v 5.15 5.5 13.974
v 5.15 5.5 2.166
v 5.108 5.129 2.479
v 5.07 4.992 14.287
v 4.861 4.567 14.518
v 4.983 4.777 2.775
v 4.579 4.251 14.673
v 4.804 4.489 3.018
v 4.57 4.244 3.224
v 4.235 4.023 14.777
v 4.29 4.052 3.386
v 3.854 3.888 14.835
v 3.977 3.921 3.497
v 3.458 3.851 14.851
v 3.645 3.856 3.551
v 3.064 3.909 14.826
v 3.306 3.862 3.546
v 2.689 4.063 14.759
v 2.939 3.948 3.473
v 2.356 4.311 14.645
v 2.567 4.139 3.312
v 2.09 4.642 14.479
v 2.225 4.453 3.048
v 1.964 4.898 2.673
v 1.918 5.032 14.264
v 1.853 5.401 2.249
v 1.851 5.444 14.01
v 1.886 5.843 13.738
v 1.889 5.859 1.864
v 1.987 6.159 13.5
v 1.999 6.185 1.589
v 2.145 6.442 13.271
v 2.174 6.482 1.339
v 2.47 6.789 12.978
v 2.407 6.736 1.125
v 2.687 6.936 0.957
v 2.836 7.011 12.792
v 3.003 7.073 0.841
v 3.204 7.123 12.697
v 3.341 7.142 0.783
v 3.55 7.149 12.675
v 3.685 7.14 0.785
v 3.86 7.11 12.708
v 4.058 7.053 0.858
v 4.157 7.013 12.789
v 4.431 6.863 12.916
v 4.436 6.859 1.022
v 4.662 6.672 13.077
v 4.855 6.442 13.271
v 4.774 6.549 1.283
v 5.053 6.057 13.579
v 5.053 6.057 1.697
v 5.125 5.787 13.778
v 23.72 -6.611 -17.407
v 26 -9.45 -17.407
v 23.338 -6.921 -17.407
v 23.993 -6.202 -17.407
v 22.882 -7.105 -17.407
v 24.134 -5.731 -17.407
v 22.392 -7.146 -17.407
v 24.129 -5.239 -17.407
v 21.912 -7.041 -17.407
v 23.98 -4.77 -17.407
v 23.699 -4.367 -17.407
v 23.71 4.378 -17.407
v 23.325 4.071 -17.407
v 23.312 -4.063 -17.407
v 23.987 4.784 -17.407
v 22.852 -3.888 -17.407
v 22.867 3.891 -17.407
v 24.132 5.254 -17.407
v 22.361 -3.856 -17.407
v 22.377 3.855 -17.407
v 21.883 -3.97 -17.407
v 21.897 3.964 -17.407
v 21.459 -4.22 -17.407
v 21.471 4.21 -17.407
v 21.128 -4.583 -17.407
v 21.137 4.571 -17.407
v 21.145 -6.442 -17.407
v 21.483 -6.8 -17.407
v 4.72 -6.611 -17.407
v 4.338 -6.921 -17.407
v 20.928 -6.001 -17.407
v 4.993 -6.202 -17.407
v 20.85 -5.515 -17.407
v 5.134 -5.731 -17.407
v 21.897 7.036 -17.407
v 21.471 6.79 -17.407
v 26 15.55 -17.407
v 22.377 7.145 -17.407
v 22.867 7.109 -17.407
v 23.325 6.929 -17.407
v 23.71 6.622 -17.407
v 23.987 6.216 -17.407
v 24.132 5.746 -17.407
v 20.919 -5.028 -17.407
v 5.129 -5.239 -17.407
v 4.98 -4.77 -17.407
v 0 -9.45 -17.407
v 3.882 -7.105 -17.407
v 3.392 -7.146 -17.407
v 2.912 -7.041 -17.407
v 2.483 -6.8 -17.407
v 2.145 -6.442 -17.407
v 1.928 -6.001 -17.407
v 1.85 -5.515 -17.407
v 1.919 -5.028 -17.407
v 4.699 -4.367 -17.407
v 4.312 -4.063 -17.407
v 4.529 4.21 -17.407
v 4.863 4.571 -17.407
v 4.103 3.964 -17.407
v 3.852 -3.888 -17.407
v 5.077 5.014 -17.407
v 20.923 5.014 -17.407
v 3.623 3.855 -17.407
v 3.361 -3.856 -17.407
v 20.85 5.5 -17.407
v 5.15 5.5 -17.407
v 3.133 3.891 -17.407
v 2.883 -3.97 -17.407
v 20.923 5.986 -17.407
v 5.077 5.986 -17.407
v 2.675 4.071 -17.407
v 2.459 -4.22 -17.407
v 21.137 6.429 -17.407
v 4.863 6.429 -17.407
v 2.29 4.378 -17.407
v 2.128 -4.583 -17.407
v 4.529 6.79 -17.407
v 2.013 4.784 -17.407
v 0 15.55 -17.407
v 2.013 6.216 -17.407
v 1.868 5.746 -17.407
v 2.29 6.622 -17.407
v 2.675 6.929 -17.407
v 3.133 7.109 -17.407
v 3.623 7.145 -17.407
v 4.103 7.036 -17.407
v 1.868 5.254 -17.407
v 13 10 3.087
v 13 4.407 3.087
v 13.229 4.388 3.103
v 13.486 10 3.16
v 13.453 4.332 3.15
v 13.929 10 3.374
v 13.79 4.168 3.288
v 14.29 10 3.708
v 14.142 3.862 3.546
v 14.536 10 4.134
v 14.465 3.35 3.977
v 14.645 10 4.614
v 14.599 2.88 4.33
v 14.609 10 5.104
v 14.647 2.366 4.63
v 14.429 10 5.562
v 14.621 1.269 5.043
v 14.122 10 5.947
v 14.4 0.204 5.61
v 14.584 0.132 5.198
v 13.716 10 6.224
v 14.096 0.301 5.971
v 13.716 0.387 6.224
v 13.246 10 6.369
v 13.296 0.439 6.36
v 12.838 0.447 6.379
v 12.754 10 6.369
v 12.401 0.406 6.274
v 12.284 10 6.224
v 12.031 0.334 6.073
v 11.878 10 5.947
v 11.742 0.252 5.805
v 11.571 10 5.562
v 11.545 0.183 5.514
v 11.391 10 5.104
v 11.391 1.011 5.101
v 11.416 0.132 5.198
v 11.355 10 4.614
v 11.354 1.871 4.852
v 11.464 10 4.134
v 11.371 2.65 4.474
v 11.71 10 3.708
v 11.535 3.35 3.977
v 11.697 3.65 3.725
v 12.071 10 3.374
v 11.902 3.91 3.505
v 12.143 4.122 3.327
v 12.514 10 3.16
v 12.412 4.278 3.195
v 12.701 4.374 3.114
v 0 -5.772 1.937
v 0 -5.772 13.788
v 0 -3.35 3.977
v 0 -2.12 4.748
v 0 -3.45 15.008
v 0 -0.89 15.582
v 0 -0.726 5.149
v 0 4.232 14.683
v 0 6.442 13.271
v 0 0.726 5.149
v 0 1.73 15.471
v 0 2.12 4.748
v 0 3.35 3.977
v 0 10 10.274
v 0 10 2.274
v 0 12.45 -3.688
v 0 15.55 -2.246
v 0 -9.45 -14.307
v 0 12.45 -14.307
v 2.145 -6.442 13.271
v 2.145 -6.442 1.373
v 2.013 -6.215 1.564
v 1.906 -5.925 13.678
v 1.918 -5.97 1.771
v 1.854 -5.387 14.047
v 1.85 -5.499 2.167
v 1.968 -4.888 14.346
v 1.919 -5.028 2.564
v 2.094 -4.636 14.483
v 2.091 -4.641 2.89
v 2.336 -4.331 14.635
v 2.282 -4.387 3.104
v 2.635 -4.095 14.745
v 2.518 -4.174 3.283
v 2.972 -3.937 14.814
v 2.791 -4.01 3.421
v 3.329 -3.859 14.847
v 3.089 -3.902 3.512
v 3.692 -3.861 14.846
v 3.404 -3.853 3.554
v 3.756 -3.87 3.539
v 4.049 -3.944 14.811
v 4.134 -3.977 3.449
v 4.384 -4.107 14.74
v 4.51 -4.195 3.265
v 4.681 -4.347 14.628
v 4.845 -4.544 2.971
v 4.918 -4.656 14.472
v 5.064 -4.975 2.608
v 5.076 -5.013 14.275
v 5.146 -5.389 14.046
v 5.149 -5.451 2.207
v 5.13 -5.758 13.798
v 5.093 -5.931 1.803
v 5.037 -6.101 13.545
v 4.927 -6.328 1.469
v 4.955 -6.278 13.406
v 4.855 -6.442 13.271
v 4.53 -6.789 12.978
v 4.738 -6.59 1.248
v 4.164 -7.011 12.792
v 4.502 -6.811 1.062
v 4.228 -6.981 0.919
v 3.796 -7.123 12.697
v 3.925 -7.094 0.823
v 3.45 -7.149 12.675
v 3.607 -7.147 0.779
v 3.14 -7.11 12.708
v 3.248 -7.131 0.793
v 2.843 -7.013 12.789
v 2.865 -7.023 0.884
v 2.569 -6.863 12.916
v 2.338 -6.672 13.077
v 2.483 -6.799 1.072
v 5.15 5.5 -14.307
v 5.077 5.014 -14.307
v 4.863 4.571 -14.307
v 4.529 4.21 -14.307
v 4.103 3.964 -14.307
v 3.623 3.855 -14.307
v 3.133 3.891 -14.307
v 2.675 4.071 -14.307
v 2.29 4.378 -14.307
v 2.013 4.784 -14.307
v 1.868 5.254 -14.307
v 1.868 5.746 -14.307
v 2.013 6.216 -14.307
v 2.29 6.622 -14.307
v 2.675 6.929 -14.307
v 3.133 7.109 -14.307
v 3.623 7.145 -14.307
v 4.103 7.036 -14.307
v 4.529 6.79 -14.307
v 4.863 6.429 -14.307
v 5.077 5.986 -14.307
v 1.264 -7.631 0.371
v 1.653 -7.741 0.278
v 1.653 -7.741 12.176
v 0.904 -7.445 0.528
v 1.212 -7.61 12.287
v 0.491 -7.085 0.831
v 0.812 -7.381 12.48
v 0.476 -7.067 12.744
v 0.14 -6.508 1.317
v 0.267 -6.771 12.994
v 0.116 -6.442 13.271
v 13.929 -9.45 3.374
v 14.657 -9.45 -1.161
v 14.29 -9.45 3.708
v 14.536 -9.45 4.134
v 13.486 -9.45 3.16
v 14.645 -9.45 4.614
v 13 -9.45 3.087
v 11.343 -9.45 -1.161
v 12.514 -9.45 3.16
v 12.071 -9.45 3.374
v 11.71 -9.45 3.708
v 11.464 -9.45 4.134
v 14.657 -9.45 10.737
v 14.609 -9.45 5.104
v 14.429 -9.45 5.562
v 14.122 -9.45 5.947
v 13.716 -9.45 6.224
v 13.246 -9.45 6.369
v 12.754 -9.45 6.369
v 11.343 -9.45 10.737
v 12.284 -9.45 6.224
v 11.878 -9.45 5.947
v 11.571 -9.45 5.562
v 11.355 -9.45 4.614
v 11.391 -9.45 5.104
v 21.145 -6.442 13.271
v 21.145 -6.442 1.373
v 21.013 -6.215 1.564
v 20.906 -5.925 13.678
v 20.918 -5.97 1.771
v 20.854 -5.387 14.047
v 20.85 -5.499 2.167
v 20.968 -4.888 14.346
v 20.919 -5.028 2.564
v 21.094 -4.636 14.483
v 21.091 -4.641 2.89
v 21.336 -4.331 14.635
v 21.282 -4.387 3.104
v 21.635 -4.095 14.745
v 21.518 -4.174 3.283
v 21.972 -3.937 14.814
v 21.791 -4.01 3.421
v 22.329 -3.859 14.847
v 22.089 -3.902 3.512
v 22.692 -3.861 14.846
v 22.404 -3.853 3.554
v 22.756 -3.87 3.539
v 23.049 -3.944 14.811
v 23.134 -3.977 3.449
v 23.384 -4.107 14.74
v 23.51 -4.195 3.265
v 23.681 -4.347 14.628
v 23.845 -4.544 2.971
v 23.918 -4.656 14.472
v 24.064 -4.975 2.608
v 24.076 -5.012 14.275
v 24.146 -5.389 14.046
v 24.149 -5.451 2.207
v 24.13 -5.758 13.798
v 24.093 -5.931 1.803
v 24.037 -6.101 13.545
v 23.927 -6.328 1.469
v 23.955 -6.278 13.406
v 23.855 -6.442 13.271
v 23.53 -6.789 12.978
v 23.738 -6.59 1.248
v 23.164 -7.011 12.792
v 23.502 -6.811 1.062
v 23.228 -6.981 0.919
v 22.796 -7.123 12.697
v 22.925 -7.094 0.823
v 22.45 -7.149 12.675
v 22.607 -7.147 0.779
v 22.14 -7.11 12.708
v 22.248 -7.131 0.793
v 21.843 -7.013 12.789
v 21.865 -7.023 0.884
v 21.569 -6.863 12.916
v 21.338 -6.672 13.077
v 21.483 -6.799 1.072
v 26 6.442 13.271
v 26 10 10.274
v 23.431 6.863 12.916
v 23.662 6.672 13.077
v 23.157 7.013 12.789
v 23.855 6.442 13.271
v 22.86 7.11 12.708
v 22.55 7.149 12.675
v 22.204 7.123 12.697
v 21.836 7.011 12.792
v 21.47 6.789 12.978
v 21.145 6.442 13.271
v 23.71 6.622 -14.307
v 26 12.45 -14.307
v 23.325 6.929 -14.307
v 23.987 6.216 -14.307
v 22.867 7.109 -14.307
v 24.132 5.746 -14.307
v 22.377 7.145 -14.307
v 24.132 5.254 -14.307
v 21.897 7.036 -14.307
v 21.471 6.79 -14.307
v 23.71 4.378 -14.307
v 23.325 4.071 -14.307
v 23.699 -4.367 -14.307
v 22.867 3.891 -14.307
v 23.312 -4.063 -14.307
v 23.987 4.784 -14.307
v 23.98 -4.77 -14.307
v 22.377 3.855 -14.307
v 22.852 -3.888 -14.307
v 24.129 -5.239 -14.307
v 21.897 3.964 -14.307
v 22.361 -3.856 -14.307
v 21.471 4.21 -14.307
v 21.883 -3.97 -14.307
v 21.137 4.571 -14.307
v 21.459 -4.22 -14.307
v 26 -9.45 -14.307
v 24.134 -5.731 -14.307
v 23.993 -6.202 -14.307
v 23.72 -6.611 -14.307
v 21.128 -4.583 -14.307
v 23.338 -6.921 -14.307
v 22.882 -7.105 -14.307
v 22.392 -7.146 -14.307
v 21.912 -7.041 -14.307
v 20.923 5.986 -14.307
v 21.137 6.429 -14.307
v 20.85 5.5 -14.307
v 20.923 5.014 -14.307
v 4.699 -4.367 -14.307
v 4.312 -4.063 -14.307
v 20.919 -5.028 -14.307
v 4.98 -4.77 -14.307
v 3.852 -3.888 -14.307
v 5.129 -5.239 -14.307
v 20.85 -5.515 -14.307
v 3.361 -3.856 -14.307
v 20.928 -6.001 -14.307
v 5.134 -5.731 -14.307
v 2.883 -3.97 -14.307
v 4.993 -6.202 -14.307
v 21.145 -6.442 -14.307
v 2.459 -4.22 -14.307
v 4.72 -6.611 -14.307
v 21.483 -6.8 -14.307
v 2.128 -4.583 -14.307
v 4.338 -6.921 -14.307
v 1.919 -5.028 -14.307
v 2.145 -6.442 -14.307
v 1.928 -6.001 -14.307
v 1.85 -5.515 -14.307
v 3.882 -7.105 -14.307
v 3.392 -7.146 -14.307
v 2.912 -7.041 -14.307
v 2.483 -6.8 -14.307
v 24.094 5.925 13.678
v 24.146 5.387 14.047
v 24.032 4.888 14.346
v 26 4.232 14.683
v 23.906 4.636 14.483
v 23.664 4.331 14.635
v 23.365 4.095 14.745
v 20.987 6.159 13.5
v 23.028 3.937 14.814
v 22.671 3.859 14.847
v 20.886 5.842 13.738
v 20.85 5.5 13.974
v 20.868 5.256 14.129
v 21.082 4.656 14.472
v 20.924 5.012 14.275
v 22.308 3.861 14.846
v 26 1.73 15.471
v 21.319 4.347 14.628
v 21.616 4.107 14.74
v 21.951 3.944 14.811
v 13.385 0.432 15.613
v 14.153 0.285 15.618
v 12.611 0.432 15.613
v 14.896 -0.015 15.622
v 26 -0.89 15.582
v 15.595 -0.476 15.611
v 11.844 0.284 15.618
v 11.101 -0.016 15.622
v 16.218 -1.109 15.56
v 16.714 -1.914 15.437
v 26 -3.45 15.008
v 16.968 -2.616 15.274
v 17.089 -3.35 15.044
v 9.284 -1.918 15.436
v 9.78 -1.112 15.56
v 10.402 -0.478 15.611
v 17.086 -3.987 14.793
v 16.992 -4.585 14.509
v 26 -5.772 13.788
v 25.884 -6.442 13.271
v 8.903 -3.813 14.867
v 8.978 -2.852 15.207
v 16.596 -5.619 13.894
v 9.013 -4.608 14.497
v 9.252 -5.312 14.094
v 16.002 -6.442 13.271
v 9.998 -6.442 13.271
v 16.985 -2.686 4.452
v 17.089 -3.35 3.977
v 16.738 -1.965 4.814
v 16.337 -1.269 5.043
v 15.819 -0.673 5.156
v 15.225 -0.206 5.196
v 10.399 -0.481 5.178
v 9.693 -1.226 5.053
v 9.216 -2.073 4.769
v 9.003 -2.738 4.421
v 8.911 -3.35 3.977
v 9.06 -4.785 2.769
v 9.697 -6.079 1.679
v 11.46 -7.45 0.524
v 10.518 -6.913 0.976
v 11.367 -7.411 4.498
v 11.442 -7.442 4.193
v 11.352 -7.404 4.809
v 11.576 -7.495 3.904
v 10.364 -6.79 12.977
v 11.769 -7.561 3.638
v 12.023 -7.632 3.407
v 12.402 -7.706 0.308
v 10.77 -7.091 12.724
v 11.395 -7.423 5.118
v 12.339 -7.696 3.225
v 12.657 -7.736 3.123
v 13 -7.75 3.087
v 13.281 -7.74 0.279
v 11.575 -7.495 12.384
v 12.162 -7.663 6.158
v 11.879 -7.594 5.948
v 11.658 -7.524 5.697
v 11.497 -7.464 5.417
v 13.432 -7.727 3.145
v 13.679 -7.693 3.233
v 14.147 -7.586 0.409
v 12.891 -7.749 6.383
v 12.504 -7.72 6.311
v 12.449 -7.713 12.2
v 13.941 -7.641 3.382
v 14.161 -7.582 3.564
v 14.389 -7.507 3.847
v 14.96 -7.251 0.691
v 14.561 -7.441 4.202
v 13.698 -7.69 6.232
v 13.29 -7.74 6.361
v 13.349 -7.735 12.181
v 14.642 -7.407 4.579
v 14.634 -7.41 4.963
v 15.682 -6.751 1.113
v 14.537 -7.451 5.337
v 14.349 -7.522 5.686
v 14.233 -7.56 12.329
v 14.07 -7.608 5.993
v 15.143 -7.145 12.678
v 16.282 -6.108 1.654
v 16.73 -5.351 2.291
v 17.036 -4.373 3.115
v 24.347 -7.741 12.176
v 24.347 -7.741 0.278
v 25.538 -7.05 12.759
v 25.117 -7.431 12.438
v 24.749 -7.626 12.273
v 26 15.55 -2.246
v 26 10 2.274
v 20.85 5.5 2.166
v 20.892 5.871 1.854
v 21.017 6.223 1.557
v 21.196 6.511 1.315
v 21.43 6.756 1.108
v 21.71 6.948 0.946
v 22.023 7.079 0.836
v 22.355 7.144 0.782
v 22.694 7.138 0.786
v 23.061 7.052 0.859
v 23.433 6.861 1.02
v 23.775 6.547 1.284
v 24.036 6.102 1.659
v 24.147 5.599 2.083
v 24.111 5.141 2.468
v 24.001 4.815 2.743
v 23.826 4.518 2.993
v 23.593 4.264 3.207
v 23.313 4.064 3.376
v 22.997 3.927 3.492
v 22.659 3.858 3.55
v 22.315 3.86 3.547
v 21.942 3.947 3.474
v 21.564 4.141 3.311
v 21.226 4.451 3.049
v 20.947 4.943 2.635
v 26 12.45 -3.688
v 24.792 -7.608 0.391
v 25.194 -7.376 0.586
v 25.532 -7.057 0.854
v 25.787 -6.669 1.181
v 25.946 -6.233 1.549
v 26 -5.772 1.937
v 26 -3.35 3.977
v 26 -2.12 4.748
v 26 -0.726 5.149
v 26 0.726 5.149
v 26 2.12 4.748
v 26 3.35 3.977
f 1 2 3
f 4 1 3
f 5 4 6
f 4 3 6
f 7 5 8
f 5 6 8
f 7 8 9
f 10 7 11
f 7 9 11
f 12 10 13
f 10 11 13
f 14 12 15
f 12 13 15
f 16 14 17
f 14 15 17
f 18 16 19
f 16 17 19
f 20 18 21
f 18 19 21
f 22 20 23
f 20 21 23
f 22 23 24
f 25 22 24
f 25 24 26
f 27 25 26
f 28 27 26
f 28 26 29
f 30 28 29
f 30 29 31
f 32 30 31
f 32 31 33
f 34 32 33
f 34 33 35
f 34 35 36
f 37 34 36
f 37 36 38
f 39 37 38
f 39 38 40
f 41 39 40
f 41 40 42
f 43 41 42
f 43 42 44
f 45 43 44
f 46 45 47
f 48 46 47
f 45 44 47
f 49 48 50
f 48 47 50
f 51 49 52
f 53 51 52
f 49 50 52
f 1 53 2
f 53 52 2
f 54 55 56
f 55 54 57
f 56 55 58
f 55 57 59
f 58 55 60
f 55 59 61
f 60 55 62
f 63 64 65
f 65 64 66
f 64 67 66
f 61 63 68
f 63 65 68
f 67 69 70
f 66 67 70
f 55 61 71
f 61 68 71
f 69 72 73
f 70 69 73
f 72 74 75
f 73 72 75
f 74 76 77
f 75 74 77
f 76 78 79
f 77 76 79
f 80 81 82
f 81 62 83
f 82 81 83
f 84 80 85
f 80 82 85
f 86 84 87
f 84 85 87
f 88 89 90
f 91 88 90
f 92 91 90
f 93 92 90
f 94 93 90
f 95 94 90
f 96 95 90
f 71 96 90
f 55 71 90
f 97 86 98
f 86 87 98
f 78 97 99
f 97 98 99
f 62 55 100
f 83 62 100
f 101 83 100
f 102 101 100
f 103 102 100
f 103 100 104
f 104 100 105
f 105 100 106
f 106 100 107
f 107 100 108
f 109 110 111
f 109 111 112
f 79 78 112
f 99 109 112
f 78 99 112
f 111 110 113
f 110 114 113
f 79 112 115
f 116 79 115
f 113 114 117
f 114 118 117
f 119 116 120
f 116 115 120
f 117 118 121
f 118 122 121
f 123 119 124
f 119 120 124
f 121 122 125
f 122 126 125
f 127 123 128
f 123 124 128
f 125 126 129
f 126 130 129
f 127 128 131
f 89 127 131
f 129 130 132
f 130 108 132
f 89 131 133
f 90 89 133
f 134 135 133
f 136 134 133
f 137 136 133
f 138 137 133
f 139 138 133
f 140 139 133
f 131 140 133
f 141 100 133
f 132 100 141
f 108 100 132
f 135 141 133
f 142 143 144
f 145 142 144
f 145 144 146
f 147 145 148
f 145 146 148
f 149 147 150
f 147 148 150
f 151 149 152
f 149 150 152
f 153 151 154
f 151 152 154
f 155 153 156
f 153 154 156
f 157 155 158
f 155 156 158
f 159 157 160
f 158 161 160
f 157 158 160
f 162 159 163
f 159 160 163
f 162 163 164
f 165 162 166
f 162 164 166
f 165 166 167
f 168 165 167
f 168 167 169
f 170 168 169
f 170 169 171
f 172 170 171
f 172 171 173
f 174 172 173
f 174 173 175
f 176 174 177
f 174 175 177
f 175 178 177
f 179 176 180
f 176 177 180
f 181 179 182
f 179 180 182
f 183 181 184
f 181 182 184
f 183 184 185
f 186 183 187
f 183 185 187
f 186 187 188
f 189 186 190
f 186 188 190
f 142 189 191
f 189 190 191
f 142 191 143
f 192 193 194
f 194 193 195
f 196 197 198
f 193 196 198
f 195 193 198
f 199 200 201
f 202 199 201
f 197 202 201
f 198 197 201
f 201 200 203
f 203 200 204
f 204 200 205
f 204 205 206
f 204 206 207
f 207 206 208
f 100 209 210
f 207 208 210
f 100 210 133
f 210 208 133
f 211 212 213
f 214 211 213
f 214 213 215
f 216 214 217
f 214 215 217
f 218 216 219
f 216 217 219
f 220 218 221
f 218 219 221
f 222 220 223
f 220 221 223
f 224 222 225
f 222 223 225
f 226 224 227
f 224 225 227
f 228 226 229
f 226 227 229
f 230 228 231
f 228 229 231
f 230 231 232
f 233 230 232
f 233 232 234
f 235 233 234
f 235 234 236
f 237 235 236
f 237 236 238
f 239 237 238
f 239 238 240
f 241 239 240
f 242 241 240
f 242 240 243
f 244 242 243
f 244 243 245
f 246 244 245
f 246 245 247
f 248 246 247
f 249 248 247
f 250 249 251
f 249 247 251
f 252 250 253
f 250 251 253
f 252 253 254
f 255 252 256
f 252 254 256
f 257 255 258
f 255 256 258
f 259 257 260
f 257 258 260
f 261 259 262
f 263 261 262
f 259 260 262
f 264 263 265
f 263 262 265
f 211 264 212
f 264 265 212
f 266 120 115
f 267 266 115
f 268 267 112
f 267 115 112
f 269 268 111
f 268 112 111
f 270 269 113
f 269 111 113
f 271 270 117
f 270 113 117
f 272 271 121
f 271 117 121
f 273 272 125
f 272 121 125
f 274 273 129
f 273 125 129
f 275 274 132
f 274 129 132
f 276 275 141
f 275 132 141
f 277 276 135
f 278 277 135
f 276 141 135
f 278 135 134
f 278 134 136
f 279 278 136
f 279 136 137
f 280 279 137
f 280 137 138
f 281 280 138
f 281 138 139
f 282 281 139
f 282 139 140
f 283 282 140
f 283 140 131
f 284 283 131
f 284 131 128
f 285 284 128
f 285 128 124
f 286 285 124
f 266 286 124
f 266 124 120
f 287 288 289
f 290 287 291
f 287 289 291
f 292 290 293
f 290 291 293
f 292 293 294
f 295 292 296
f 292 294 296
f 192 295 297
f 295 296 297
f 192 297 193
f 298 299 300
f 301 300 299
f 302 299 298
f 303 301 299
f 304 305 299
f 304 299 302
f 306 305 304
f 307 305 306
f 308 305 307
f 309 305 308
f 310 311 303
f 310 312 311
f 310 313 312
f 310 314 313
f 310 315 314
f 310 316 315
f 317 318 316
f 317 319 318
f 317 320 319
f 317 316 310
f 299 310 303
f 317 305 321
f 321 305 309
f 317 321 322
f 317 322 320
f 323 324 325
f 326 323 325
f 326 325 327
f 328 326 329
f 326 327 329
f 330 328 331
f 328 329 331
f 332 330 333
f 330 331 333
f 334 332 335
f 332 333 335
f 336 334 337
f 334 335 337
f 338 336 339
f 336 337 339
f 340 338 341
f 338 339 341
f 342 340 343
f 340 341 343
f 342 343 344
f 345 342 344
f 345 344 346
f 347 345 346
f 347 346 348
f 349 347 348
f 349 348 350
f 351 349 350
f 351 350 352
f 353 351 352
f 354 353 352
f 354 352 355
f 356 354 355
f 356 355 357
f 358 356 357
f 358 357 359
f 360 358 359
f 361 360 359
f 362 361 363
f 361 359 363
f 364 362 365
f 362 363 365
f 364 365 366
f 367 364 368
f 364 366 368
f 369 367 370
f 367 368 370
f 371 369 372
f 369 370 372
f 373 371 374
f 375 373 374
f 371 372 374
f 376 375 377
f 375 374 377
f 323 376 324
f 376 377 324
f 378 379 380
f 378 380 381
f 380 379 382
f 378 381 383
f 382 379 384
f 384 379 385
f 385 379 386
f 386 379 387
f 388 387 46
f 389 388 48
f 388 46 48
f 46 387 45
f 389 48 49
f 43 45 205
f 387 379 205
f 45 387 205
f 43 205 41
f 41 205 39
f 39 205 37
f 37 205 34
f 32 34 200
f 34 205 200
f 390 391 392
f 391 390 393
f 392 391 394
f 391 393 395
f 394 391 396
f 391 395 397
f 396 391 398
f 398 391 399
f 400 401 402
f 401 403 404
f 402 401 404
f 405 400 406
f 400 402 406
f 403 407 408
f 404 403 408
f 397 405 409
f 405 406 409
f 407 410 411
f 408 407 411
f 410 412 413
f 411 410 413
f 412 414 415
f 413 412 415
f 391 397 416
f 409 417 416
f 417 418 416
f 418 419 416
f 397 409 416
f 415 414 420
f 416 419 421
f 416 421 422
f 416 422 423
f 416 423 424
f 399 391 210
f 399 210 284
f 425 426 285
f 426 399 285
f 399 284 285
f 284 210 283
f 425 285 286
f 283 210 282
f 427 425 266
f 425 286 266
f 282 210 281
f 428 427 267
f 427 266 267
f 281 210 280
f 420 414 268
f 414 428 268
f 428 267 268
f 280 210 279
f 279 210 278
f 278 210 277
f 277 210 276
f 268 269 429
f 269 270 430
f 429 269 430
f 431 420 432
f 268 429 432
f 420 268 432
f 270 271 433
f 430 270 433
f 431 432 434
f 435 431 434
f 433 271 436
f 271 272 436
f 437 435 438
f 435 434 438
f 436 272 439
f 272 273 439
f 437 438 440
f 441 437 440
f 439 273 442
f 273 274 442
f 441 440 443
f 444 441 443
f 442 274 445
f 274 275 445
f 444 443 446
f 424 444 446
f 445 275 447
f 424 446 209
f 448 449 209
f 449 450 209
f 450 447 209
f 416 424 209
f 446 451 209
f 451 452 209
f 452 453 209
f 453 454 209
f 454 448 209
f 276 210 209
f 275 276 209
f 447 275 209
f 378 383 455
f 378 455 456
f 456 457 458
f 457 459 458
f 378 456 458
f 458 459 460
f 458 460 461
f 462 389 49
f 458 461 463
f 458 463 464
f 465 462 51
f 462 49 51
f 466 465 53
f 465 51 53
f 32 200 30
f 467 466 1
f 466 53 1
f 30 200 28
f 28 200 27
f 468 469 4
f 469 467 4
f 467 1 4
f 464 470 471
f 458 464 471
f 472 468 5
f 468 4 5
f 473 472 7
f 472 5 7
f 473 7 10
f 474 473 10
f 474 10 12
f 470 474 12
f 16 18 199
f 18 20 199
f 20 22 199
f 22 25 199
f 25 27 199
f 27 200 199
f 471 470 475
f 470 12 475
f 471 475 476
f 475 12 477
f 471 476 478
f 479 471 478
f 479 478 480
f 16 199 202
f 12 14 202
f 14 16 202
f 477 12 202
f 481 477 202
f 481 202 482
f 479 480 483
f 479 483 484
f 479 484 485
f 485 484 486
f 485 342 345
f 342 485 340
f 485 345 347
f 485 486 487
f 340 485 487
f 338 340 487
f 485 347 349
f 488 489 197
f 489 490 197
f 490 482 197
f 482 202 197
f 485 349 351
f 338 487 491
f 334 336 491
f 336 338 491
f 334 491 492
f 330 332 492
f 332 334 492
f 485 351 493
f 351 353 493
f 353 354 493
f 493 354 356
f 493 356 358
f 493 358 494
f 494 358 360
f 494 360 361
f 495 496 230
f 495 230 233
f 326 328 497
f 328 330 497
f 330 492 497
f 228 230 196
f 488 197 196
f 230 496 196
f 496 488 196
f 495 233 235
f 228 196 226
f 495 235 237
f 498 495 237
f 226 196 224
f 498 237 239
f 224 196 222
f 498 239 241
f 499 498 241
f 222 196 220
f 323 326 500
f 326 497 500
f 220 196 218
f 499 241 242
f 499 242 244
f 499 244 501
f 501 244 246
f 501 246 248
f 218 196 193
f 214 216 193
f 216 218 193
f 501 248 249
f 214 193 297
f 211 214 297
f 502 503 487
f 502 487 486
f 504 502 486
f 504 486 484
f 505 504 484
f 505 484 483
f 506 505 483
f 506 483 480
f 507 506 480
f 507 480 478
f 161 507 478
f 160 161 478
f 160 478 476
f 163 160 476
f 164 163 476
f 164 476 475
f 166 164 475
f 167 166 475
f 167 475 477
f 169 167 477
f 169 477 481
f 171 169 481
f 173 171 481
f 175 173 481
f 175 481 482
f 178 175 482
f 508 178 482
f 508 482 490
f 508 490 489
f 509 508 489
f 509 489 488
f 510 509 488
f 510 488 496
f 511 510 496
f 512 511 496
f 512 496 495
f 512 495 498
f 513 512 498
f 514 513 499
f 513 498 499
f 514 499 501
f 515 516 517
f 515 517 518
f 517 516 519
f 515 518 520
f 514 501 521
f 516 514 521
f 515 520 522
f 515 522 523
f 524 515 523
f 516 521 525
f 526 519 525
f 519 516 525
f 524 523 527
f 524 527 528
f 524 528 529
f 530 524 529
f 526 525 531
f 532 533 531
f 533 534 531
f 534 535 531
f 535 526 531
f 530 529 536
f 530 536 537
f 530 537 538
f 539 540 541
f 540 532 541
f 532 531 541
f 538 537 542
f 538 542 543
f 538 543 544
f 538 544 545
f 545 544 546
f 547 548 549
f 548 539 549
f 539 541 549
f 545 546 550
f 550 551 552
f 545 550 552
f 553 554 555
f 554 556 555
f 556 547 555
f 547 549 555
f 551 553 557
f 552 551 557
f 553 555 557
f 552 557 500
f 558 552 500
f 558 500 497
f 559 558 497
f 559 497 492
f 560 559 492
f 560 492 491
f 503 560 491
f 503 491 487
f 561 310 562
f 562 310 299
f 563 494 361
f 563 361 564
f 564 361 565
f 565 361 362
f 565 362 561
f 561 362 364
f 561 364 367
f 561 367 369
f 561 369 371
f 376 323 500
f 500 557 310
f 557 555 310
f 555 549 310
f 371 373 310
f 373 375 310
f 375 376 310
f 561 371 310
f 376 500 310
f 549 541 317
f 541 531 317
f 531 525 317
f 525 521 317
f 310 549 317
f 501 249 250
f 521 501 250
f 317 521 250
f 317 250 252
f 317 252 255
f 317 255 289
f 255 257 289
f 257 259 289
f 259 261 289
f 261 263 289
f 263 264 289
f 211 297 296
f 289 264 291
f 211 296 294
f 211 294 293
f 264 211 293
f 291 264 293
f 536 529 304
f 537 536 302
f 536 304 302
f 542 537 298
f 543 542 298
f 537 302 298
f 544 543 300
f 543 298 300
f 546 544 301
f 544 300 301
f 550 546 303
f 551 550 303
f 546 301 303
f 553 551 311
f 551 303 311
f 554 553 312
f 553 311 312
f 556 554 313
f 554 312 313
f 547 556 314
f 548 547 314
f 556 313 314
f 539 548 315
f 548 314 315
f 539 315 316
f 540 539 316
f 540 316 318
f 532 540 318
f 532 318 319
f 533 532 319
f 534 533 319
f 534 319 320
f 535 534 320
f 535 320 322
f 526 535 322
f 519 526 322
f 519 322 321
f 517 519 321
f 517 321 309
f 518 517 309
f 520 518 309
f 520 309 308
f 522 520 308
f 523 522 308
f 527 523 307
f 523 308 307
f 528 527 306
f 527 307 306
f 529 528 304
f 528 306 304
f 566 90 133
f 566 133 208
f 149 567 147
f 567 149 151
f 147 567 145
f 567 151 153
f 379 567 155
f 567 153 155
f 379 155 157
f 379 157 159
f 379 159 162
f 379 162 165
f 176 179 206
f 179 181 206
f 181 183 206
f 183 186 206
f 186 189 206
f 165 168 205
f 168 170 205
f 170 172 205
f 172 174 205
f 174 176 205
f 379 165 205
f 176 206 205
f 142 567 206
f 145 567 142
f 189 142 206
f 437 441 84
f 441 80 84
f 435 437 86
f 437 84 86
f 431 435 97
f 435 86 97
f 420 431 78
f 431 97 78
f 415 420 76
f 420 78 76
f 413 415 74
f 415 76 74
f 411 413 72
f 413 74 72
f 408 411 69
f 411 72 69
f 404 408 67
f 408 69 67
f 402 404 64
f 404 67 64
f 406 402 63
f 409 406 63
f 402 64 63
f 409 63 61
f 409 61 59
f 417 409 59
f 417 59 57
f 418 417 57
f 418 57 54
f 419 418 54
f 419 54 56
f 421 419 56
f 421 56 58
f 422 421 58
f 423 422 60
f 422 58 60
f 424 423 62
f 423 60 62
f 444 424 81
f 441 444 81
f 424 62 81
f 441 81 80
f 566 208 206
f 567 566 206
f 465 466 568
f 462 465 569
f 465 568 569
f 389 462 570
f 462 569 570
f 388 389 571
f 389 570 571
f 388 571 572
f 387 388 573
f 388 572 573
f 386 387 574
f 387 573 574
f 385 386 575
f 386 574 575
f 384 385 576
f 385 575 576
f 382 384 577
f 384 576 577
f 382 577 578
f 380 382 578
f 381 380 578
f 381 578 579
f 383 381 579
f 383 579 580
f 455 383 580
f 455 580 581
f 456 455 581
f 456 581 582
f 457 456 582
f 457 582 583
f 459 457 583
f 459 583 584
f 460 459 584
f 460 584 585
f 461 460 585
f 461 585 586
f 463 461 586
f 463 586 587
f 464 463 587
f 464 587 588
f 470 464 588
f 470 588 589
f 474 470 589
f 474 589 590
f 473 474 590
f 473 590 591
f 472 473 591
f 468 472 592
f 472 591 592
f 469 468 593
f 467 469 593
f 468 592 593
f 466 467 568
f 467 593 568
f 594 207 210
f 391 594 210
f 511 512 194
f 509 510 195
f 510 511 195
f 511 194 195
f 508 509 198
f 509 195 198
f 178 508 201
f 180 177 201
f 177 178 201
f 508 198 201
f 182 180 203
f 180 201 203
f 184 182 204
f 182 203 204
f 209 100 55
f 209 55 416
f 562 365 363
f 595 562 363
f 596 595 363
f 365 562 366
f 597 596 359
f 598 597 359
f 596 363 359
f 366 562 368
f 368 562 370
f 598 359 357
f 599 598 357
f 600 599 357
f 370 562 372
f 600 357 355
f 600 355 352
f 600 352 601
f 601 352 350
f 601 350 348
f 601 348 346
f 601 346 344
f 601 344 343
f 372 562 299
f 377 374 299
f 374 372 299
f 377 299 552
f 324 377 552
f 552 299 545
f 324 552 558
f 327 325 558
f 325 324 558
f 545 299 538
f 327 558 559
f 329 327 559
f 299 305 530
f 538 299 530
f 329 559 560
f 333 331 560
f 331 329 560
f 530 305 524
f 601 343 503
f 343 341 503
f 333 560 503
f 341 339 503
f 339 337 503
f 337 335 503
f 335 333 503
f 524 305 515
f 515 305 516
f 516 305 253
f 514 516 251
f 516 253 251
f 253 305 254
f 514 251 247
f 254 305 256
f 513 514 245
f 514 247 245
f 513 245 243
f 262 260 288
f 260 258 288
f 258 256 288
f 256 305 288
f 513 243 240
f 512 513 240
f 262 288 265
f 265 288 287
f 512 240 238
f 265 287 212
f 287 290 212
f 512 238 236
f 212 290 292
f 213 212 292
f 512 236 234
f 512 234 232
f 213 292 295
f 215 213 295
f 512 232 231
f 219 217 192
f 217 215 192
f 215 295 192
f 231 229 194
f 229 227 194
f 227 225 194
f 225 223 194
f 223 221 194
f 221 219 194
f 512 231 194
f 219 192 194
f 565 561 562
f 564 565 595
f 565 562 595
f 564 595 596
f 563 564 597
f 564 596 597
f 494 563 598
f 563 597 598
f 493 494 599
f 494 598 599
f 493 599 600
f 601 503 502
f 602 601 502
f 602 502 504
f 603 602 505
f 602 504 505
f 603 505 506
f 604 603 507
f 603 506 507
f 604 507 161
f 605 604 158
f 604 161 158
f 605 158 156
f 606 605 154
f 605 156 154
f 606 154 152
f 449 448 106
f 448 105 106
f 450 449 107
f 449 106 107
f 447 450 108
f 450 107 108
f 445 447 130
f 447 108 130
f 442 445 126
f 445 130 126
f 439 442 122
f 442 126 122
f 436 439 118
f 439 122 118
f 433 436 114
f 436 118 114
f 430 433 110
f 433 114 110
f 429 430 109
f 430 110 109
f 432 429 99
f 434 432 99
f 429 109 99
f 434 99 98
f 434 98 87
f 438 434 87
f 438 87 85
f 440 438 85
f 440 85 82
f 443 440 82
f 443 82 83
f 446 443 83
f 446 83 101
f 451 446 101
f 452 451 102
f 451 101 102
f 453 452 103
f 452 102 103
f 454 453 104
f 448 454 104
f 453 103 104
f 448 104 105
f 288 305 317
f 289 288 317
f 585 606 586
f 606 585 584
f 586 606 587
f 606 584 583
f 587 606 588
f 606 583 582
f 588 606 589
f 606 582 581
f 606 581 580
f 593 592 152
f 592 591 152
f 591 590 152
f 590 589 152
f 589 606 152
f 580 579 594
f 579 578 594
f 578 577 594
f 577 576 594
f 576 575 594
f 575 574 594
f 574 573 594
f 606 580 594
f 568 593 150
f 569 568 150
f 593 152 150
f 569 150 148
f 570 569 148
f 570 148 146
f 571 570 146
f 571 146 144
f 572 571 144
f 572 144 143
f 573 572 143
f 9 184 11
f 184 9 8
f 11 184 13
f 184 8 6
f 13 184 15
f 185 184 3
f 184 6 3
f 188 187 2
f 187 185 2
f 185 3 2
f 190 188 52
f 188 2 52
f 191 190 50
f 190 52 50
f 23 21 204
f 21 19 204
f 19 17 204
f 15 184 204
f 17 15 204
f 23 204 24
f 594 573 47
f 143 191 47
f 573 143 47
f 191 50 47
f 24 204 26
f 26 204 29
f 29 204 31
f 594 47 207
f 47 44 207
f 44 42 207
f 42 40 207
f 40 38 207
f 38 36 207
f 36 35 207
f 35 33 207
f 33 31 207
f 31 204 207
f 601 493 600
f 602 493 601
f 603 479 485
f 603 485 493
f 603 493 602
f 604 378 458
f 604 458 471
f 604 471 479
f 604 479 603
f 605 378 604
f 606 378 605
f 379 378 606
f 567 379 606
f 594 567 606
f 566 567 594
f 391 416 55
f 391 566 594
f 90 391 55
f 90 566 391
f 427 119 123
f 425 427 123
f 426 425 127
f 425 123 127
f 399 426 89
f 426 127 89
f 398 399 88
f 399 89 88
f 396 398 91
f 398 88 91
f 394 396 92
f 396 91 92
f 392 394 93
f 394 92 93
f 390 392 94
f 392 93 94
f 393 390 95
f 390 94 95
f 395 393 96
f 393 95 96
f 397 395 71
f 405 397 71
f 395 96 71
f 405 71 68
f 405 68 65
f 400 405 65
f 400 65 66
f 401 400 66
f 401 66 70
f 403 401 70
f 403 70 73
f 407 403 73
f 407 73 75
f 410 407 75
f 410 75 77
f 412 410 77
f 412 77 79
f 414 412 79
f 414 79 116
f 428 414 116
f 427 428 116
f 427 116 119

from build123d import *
from OCP.BRepFilletAPI import BRepFilletAPI_MakeChamfer

# Parameters (mm, degrees)
EXTRUDE_1_DEPTH     = 26
SKETCH_2_R          = 1.65
CUT_EXTRUDE_1_DEPTH = 45.819078563
SKETCH_3_W          = 28.1444964
SKETCH_3_H          = 6.1
CUT_EXTRUDE_2_DEPTH = 35.940261345
CUT_EXTRUDE_4_REACH = 46.819
SKETCH_5_R          = 4.1
SKETCH_6_R          = 1.65
CUT_EXTRUDE_5_DEPTH = 41.050210522
CHAMFER_1_SIZE      = 2
CHAMFER_1_SIZE2     = 11.342563639
FILLET_1_R          = 2


with BuildPart() as part:
    # 草图1 → 凸台-拉伸1 (new body)
    with BuildSketch(Plane(origin=(0, 0, 0), x_dir=(0, 0, -1), z_dir=(1, 0, 0))):
        with BuildLine():
            Line((17.407451211, 15.55), (2.245544981, 15.55))
            Line((2.245544981, 15.55), (-2.273793452, 10))
            Line((-2.273793452, 10), (-10.273793452, 10))
            Line((-10.273793452, 10), (-13.270509165, 6.44212097))
            ThreePointArc((-13.270509165, 6.44212097), (-15.622040206, 0), (-13.270509165, -6.44212097))
            Line((-13.270509165, -6.44212097), (-10.273793452, -10))
            Line((-10.273793452, -10), (-2.273793452, -10))
            Line((-2.273793452, -10), (2.245544981, -15.55))
            Line((2.245544981, -15.55), (17.407451211, -15.55))
            Line((17.407451211, -15.55), (17.407451211, 15.55))
        make_face()
        with BuildLine():
            Line((3.687588487, 12.45), (14.307451211, 12.45))
            Line((14.307451211, 12.45), (14.307451211, -12.45))
            Line((14.307451211, -12.45), (3.687588487, -12.45))
            Line((3.687588487, -12.45), (-3.977203858, -3.349902904))
            ThreePointArc((-3.977203858, -3.349902904), (-5.2, 0), (-3.977203858, 3.349902904))
            Line((-3.977203858, 3.349902904), (3.687588487, 12.45))
        make_face(mode=Mode.SUBTRACT)
    extrude(amount=EXTRUDE_1_DEPTH)

    # 草图2 → 切除-拉伸1 (cut, through all)
    with BuildSketch(Plane(origin=(0, 0, -17.407451211), x_dir=(-1, 0, 0), z_dir=(0, 0, -1))):
        with Locations((-22.5, 5.5)):
            Circle(SKETCH_2_R)
        with Locations(Location((-22.5, -5.5, 0), (0, 0, 325.181239638))):
            Circle(SKETCH_2_R)
        with Locations(Location((-3.5, -5.5, 0), (0, 0, 325.181239638))):
            Circle(SKETCH_2_R)
        with Locations(Location((-3.5, 5.5, 0), (0, 0, 180))):
            Circle(SKETCH_2_R)
    extrude(amount=-CUT_EXTRUDE_1_DEPTH, mode=Mode.SUBTRACT)

    # 草图3 → 切除-拉伸2 (cut, through all)
    with BuildSketch(Plane.ZY):
        with Locations((-3.335203011, -12.5)):
            Rectangle(SKETCH_3_W, SKETCH_3_H)
    extrude(amount=-CUT_EXTRUDE_2_DEPTH, mode=Mode.SUBTRACT)

    # 草图5 → 切除-拉伸4 (cut, up to next)
    with BuildSketch(Plane.XY.offset(15.622040206), mode=Mode.PRIVATE) as cut_extrude_4_sk1:
        with Locations(Location((13, -3.65, 0), (0, 0, 4.197484636))):
            Circle(SKETCH_5_R)
    cut_extrude_4_tool1 = extrude(cut_extrude_4_sk1.sketch, amount=-CUT_EXTRUDE_4_REACH, mode=Mode.PRIVATE) & part.part
    add(cut_extrude_4_tool1.solids().sort_by_distance((13, -3.65, 15.62204))[0], mode=Mode.SUBTRACT)

    # 草图6 → 切除-拉伸5 (cut, through all)
    with BuildSketch(Plane.XZ.offset(9.45)):
        with Locations(Location((13, 4.737045189, 0), (0, 0, 270))):
            Circle(SKETCH_6_R)
    extrude(amount=-CUT_EXTRUDE_5_DEPTH, mode=Mode.SUBTRACT)

    # 倒角1: one chamfer whose edges measure the first distance from different faces: ONE call of the kernel's chamfer builder (chamfer() names one face for all edges)
    chamfer_1_edges_1 = [part.edges().sort_by_distance(p)[0] for p in [
        (0, -9.45, 4.78814218),
    ]]
    chamfer_1_side_1 = [part.faces().sort_by_distance(p)[0] for p in [
        (0, -9.035760057, -15.857451211),
    ]]
    chamfer_1_edges_2 = [part.edges().sort_by_distance(p)[0] for p in [
        (26, -9.45, 4.78814218),
    ]]
    chamfer_1_side_2 = [part.faces().sort_by_distance(p)[0] for p in [
        (26, -9.035760057, -15.857451211),
    ]]
    chamfer_1 = BRepFilletAPI_MakeChamfer(part.part.solid().wrapped)
    for e in chamfer_1_edges_1:
        chamfer_1.Add(CHAMFER_1_SIZE, CHAMFER_1_SIZE2, e.wrapped, chamfer_1_side_1[0].wrapped)  # the first distance lies on this face
    for e in chamfer_1_edges_2:
        chamfer_1.Add(CHAMFER_1_SIZE, CHAMFER_1_SIZE2, e.wrapped, chamfer_1_side_2[0].wrapped)  # the first distance lies on this face
    add(Compound.cast(chamfer_1.Shape()), mode=Mode.REPLACE)

    # 圆角1
    # the kernel refuses this fillet: 2 mm, written as the material it takes off along each edge
    with BuildSketch(Plane(origin=(26, -7.45, -3.671707212), x_dir=(-0.9848077530122086, -0.17364817766692747, 0), z_dir=(0, 0, 1))) as fillet_1_piece_1:
        with BuildLine():
            CenterArc((FILLET_1_R * 0.839099631177, -FILLET_1_R), FILLET_1_R, 90, 80)
            Line((-FILLET_1_R * 0.145708121835, -FILLET_1_R * 0.826351822333), (0, 0))
            Line((0, 0), (FILLET_1_R * 0.839099631177, 0))
        make_face()
    extrude(amount=20.288802329, mode=Mode.SUBTRACT)
    with BuildSketch(Plane(origin=(0, -7.45, 16.617095117), x_dir=(0, 1, 0), z_dir=(0, 0, -1))) as fillet_1_piece_2:
        with BuildLine():
            CenterArc((FILLET_1_R * 0.839099631177, FILLET_1_R), FILLET_1_R, 190, 80)
            Line((-FILLET_1_R * 0.145708121835, FILLET_1_R * 0.826351822333), (0, 0))
            Line((0, 0), (FILLET_1_R * 0.839099631177, 0))
        make_face()
    extrude(amount=20.288802329, mode=Mode.SUBTRACT)


solid = part.part
